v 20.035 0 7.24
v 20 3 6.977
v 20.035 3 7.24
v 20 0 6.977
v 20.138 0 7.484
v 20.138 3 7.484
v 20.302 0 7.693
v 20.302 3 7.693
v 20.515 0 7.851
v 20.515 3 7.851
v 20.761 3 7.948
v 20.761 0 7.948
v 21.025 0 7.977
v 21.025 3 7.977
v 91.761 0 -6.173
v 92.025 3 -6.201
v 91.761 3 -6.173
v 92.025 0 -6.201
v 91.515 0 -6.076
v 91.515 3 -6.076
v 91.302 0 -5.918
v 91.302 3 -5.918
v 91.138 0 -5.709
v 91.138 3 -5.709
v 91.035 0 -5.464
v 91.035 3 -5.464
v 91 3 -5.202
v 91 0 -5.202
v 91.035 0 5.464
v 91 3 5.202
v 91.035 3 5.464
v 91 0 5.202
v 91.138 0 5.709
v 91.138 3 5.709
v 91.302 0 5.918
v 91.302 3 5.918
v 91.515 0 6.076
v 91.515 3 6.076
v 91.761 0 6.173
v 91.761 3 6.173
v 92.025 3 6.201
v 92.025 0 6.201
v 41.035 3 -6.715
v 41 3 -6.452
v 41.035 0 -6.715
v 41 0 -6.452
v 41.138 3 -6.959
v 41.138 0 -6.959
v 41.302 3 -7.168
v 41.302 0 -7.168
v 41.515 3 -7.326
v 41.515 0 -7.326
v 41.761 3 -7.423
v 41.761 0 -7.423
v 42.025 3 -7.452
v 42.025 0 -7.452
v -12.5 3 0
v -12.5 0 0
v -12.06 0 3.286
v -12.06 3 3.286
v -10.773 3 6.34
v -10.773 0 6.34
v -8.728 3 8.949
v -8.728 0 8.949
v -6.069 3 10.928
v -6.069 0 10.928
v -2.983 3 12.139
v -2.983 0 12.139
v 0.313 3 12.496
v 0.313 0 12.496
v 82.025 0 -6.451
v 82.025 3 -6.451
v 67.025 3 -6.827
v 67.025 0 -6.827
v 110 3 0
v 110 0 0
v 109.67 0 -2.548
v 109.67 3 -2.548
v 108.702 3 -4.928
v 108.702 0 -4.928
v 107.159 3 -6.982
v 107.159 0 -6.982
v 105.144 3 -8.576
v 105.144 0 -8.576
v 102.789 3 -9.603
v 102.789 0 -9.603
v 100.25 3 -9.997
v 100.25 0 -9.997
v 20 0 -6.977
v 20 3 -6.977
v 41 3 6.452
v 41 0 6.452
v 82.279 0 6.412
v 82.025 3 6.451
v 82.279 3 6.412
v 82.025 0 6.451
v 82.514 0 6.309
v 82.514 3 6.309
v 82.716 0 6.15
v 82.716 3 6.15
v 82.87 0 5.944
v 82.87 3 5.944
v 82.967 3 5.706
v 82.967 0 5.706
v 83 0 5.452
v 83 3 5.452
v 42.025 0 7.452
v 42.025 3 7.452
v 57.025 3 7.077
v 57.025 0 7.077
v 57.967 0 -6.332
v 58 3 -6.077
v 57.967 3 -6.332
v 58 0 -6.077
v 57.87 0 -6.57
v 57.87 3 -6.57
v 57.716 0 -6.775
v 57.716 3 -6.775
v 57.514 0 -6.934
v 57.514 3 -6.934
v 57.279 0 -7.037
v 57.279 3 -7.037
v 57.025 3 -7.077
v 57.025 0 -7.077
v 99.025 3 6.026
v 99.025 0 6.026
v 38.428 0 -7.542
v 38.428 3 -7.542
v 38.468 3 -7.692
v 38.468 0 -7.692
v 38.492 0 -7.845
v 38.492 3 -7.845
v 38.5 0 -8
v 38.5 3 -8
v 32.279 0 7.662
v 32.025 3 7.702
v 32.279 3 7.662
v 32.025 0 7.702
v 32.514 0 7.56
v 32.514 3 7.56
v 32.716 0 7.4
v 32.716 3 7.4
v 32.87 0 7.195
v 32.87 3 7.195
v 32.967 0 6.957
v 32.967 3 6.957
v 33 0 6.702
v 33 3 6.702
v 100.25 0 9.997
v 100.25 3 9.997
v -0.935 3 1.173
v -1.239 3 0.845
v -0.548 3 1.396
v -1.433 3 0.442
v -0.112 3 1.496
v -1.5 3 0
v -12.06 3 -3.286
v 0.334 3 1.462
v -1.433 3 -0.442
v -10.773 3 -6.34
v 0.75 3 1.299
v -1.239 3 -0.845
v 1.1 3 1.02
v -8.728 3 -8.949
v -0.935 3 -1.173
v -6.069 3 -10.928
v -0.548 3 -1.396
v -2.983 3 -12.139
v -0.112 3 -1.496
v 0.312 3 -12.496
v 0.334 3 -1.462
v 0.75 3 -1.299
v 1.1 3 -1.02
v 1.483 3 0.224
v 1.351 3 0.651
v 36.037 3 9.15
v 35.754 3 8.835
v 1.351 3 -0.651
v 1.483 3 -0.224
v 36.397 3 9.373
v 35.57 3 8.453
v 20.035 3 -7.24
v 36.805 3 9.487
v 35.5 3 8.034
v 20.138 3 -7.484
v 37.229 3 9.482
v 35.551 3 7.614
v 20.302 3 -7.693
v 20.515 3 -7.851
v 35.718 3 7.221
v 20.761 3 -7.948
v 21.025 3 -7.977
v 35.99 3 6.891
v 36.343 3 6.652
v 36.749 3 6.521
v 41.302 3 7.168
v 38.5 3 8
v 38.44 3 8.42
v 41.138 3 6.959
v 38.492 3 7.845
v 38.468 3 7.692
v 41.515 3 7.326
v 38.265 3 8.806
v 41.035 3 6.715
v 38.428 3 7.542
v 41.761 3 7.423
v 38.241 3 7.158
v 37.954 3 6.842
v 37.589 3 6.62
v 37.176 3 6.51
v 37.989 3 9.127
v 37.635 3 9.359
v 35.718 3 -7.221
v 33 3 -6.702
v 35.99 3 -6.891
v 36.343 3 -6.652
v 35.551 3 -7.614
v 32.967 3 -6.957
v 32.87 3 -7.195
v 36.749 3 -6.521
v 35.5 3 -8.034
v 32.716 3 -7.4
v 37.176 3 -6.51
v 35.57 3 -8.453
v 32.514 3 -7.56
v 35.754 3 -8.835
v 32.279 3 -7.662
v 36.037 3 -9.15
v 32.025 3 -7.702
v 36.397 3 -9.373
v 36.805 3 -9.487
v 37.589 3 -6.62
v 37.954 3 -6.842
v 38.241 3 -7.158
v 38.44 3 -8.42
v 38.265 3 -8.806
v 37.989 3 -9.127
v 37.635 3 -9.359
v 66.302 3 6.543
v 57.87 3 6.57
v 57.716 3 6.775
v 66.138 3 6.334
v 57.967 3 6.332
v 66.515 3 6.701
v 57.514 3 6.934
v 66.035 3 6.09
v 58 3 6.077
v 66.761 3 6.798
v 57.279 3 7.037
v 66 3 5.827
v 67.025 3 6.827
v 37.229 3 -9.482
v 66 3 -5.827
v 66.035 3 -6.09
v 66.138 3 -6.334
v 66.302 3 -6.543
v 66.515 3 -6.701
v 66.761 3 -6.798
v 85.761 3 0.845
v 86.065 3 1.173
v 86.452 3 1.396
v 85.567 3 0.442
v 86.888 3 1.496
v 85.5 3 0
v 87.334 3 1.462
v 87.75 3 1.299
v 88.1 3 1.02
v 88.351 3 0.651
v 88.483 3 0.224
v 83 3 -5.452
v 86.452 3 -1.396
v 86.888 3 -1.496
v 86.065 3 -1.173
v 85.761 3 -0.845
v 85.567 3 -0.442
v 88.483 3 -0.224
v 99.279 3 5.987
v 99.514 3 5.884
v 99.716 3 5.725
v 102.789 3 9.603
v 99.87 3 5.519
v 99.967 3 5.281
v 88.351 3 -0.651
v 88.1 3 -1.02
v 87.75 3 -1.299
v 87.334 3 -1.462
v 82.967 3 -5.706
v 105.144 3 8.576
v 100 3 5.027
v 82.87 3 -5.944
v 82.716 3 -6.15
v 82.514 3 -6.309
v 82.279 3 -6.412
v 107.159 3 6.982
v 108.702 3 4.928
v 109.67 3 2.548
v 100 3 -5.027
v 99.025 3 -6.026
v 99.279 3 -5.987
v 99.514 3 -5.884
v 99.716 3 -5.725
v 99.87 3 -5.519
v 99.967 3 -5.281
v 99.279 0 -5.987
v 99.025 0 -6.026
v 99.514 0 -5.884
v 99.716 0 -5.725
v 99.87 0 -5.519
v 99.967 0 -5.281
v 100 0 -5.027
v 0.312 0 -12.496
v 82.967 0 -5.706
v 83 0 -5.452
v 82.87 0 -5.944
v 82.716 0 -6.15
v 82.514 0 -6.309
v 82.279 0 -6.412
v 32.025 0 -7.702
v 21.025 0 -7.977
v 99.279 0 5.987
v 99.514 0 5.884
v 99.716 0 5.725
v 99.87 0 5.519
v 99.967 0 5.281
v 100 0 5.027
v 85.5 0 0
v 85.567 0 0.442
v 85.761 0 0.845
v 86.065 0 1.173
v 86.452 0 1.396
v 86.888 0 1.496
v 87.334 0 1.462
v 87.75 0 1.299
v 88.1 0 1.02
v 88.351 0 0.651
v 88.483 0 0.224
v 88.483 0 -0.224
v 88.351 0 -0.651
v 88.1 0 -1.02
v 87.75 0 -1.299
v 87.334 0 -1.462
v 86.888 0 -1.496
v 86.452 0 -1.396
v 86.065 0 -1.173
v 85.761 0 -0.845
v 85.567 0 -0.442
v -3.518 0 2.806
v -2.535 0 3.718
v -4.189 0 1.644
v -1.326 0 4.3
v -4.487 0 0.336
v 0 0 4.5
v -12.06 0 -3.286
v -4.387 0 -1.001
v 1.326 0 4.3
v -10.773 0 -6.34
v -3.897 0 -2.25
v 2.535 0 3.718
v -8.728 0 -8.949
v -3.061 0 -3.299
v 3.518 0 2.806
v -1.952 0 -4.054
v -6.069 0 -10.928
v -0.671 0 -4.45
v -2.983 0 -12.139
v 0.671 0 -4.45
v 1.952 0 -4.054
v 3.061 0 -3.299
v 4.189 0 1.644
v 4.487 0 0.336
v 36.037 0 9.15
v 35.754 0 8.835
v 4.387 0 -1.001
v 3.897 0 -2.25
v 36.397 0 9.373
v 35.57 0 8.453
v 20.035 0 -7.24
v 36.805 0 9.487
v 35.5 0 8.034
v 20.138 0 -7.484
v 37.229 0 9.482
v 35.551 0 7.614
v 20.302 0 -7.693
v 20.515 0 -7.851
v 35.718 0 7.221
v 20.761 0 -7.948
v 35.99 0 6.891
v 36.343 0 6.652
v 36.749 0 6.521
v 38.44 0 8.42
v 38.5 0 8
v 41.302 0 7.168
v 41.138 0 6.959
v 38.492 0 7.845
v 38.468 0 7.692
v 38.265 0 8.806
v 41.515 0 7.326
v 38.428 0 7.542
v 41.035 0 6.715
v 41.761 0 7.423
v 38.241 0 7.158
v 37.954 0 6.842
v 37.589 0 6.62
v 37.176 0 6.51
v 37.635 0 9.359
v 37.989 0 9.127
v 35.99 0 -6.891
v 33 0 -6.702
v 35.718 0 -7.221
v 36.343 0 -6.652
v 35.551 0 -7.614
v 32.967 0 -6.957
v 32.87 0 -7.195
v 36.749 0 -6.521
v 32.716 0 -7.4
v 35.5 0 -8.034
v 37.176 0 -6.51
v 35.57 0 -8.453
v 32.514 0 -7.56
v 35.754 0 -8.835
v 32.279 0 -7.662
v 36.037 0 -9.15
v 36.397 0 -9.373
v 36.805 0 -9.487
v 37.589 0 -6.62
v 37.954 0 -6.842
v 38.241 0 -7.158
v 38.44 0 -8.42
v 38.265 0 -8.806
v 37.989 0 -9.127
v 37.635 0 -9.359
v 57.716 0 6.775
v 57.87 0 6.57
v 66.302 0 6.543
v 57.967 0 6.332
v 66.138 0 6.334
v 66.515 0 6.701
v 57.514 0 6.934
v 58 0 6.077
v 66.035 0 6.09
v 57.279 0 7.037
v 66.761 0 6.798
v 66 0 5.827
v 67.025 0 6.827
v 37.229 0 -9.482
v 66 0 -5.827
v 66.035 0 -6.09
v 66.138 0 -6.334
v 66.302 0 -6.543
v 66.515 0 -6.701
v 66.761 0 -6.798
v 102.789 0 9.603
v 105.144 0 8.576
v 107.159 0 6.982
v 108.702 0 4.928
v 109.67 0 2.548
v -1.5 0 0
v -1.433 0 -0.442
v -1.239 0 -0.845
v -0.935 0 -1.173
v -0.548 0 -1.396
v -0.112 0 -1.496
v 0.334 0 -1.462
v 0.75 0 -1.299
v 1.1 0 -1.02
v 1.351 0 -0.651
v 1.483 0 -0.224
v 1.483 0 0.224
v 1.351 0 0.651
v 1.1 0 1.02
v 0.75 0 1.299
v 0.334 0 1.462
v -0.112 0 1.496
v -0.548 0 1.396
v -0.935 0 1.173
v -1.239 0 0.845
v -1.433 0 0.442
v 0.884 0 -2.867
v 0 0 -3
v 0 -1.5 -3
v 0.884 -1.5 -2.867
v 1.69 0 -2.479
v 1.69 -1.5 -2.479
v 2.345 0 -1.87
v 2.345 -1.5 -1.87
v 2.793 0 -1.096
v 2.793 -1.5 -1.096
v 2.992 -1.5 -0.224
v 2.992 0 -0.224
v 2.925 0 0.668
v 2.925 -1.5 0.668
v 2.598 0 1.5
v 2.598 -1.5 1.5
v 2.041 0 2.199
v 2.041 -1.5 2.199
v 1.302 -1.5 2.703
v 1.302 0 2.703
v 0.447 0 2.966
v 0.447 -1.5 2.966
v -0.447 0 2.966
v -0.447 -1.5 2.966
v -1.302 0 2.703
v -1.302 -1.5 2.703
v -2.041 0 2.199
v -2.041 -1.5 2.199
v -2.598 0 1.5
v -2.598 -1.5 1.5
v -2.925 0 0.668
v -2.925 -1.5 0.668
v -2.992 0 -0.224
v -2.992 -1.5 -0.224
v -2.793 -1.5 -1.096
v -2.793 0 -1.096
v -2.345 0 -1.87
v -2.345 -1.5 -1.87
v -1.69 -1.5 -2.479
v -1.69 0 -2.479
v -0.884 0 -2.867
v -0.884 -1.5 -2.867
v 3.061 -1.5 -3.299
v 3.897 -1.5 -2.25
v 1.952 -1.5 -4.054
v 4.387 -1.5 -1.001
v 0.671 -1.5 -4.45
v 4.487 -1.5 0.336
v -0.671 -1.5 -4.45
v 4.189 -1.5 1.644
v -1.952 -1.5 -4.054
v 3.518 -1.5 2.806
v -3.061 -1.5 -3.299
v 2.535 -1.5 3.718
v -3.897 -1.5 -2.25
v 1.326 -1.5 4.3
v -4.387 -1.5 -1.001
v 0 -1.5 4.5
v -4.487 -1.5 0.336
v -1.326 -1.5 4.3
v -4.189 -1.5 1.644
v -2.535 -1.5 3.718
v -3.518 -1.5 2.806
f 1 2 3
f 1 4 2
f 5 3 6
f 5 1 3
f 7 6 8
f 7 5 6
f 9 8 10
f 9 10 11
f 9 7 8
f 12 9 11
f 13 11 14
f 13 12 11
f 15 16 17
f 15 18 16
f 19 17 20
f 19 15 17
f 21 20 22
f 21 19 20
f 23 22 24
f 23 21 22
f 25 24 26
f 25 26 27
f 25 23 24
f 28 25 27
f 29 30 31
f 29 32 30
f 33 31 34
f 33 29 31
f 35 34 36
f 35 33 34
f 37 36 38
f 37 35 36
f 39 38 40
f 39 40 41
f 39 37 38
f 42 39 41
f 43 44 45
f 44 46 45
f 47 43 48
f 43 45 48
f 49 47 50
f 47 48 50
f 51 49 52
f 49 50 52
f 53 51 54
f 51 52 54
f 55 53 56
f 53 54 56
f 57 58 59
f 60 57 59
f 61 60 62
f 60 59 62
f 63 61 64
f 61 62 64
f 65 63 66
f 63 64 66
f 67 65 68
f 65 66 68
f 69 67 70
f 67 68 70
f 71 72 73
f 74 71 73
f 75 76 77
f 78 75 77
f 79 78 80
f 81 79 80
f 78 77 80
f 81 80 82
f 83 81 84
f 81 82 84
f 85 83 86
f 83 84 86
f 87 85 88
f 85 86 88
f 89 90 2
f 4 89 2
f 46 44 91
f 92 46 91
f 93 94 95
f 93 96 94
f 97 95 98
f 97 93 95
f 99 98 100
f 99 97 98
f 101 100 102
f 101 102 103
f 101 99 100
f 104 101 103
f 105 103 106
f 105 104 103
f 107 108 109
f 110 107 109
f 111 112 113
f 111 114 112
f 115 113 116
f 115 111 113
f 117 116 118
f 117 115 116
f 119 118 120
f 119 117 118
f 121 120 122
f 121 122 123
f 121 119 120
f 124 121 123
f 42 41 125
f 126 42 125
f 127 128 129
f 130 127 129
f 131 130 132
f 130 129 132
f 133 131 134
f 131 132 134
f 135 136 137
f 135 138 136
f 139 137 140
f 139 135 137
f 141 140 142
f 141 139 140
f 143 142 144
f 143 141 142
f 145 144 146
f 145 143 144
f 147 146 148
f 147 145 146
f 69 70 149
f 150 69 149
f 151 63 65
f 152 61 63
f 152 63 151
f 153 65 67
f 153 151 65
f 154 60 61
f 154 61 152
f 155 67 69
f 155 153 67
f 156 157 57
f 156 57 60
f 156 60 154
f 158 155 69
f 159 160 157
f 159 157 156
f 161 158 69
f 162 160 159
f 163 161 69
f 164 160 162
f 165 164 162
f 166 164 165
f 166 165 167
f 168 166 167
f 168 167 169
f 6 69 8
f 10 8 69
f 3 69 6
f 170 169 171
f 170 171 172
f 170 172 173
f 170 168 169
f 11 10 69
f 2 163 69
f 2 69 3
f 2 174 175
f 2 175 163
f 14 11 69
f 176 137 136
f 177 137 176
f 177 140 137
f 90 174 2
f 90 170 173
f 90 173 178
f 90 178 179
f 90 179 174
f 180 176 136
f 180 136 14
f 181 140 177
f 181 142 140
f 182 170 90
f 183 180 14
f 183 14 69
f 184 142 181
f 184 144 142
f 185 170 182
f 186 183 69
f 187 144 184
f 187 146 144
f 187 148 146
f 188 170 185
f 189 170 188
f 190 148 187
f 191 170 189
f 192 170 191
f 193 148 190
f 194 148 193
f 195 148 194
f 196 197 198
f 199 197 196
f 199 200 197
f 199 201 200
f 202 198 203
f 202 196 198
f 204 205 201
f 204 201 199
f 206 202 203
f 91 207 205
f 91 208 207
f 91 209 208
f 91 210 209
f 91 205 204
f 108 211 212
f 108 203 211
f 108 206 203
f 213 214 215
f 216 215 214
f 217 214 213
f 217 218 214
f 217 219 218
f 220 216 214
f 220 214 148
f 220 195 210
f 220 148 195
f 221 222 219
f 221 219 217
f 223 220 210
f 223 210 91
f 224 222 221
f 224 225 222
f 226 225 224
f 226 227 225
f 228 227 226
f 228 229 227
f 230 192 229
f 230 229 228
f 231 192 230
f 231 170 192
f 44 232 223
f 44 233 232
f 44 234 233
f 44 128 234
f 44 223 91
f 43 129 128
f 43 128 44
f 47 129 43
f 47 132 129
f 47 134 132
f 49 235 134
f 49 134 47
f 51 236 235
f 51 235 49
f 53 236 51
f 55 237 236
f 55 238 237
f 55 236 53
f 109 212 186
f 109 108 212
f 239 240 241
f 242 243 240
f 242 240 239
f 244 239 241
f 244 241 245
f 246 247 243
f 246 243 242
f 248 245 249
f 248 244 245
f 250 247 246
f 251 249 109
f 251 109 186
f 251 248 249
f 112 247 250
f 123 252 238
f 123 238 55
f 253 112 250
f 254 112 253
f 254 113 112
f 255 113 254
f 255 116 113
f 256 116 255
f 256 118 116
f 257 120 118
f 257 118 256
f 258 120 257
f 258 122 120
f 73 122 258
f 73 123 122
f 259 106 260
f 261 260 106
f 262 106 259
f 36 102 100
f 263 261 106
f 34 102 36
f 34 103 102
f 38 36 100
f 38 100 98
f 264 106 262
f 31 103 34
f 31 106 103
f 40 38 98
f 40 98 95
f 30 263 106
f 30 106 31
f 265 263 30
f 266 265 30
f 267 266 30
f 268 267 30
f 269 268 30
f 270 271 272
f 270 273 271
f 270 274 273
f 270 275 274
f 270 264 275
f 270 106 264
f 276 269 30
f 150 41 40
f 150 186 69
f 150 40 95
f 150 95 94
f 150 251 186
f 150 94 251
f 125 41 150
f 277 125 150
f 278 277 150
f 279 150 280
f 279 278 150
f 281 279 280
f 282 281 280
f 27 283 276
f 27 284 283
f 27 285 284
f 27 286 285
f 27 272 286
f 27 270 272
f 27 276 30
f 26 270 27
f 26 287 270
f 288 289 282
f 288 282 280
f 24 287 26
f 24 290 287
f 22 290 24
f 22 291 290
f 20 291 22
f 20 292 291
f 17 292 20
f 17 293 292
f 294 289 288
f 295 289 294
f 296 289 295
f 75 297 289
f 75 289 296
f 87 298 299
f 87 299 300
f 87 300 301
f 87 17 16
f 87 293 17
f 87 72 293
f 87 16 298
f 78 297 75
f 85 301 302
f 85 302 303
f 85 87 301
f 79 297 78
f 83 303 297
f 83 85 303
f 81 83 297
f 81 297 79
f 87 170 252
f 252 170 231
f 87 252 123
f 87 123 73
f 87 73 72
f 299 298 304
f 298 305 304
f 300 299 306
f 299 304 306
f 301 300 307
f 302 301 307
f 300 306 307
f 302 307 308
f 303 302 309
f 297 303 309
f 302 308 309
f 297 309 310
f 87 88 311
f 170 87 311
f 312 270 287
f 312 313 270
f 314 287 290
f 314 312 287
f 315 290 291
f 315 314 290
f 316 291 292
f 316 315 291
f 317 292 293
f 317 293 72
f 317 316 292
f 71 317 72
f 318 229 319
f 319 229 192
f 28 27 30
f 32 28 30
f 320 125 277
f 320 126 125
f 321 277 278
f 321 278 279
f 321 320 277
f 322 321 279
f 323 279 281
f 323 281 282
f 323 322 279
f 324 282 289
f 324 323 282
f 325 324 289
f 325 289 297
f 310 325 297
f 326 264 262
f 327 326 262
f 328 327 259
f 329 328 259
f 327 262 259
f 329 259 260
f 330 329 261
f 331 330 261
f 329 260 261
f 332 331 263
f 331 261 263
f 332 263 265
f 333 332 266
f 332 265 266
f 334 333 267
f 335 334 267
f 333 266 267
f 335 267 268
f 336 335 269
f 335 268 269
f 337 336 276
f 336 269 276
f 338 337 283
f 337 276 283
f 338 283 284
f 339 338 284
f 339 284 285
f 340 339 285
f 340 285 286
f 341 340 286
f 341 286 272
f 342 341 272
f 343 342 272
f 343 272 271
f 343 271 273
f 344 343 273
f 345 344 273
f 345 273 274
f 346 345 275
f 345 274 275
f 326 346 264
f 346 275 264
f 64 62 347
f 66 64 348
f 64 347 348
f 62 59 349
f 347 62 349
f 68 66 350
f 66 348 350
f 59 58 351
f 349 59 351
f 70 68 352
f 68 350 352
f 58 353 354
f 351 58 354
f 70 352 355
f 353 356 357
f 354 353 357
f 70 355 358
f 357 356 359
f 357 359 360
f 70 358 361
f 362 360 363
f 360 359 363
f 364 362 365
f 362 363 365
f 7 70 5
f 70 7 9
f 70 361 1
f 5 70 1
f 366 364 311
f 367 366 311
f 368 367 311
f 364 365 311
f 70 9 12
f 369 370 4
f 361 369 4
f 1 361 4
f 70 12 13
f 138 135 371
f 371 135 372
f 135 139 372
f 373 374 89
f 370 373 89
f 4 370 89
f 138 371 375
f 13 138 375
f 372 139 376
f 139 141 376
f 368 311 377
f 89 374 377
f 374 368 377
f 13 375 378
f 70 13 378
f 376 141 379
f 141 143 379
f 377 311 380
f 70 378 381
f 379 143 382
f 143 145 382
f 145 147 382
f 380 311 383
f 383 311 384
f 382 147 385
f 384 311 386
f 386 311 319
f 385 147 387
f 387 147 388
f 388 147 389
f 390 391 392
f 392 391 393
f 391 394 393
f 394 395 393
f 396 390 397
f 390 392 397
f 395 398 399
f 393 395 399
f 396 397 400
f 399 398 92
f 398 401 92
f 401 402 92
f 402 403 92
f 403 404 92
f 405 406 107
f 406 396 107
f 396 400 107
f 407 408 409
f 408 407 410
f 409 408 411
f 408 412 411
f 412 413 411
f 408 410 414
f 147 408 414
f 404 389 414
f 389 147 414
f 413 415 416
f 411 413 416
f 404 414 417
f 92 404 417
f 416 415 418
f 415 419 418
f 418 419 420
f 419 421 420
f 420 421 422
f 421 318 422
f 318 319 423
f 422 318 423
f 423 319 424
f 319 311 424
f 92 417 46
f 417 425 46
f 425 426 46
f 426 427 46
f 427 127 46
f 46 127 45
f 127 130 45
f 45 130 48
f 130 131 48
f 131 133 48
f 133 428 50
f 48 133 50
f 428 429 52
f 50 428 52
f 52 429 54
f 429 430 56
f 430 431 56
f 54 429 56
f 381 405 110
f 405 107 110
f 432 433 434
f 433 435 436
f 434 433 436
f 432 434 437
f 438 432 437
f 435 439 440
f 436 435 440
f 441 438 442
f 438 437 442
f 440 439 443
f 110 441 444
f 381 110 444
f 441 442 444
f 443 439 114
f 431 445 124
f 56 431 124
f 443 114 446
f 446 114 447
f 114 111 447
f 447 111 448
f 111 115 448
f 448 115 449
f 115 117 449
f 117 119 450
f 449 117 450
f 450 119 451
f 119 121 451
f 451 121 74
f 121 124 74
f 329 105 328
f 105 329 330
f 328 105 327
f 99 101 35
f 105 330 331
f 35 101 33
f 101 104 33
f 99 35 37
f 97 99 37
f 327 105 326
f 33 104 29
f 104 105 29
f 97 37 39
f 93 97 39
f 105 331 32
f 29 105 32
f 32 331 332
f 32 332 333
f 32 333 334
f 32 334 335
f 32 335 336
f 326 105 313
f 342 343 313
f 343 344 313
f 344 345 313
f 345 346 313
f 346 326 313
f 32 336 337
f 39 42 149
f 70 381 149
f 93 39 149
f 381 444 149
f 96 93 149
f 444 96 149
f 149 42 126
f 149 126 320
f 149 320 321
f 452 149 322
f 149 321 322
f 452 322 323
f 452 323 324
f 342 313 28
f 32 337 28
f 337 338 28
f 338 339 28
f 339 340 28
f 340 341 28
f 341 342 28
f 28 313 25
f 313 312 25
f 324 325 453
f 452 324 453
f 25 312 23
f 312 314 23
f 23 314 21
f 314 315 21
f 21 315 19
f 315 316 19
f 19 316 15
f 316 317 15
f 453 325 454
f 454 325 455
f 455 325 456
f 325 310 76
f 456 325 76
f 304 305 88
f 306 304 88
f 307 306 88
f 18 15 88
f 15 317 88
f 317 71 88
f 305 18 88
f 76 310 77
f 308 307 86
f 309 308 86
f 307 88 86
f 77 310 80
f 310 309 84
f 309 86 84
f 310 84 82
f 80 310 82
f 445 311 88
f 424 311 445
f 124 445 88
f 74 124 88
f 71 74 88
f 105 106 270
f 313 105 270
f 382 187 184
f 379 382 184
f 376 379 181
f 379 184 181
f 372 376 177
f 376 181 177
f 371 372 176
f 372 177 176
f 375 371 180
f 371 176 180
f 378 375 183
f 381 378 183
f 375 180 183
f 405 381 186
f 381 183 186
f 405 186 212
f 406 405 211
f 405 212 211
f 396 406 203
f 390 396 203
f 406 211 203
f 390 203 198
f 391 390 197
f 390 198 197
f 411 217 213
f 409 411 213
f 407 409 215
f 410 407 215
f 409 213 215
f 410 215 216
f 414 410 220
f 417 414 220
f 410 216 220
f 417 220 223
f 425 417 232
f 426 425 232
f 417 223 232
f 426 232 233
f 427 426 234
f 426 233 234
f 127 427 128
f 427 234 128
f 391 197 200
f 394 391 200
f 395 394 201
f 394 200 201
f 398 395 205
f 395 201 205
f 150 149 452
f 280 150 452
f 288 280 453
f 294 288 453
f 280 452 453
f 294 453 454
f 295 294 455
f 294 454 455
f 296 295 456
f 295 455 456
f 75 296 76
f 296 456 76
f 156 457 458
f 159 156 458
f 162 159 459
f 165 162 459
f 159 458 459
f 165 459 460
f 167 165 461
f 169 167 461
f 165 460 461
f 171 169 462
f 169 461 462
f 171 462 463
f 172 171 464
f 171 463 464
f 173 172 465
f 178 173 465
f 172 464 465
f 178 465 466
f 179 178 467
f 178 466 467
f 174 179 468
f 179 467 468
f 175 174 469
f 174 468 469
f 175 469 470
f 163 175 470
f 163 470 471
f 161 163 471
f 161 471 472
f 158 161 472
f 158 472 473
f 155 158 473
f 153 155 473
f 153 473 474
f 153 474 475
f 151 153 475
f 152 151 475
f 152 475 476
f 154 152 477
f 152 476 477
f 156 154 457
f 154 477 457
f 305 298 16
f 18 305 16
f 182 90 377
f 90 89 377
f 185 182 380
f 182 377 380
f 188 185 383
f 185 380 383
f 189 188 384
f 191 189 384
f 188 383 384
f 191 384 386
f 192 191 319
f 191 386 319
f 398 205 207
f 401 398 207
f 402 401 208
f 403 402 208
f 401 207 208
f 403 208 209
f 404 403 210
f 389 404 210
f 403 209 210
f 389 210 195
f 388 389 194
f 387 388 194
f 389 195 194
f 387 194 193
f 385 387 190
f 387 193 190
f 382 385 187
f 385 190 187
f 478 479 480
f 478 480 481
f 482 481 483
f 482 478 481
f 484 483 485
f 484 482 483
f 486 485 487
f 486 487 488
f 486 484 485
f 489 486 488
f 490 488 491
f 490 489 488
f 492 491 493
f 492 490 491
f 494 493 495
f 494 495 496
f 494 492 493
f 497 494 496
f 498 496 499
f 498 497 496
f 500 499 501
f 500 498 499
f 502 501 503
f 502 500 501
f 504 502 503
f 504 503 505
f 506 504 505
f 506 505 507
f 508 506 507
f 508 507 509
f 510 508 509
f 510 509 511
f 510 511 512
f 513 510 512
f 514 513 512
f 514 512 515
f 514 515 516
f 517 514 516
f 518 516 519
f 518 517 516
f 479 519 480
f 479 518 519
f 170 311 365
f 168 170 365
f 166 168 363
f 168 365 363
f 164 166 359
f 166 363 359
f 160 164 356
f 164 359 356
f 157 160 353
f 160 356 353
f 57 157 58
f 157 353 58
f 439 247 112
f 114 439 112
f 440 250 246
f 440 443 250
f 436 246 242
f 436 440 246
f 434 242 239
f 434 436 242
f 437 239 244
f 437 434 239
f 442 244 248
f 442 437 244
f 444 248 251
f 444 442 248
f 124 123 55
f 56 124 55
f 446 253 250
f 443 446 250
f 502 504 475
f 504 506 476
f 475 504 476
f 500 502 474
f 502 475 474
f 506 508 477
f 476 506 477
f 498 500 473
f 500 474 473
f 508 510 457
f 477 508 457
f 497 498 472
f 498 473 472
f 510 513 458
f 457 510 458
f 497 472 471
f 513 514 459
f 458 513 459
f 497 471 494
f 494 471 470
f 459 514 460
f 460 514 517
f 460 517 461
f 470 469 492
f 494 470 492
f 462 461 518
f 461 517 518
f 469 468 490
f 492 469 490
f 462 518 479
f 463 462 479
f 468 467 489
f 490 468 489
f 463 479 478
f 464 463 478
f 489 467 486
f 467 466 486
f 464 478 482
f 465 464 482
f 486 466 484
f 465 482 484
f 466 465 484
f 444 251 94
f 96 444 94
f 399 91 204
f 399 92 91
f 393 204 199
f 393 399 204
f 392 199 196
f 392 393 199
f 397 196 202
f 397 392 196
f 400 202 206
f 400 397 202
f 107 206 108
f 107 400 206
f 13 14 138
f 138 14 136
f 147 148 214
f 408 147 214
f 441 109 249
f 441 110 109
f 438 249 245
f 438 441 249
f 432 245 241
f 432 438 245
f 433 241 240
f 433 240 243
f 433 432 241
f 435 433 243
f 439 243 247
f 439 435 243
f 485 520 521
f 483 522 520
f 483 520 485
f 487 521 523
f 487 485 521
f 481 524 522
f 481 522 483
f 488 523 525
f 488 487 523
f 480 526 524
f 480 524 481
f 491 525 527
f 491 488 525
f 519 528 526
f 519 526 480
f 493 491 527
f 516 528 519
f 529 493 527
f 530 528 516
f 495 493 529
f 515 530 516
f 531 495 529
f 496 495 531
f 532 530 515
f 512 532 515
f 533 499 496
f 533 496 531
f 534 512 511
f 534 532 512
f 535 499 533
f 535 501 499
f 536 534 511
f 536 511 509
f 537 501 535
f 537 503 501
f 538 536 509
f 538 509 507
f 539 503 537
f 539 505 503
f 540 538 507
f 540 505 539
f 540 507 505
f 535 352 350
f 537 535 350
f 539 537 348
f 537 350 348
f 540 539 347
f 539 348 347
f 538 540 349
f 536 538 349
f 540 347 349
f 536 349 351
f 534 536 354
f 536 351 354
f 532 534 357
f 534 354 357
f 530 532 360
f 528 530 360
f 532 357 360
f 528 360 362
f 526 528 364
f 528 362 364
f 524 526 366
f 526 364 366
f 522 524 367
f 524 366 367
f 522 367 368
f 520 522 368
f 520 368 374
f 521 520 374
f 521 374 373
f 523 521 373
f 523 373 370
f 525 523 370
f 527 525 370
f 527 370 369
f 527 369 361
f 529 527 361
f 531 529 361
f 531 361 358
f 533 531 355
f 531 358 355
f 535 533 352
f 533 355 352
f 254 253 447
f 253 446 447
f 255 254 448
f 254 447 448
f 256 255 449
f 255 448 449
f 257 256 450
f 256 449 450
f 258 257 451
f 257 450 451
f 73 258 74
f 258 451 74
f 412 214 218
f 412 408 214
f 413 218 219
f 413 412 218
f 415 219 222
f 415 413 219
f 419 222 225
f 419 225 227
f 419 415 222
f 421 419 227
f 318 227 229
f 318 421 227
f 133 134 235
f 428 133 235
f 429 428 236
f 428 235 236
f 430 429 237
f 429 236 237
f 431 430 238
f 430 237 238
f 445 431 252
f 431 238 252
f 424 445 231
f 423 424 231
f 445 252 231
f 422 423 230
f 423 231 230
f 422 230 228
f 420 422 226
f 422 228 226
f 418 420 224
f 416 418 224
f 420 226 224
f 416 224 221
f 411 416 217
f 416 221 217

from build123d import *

# Parameters (mm, degrees)
EXTRUDE_1_DEPTH     = 3
SKETCH_2_R          = 4.5
SKETCH_2_R_2        = 3
EXTRUDE_2_DEPTH     = 1.5
CUT_EXTRUDE_1_DEPTH = 3
FILLET_1_R          = 1


with BuildPart() as part:
    # 草图1 → 凸台-拉伸1 (new body)
    with BuildSketch(Plane(origin=(0, 0, 0), x_dir=(1, 0, 0), z_dir=(0, 1, 0))):
        with BuildLine():
            ThreePointArc((-1.5, 0), (0, 1.5), (1.5, 0))
            Line((1.5, 0), (12.5, 0))
            ThreePointArc((12.5, 0), (8.948638165, 8.727650027), (0.3125, 12.496093139))
            ThreePointArc((0.3125, 12.496093139), (-8.727650027, 8.948638165), (-12.5, 0))
            Line((-12.5, 0), (-1.5, 0))
        make_face()
        with BuildLine():
            Line((12.5, 0), (1.5, 0))
            ThreePointArc((1.5, 0), (0, -1.5), (-1.5, 0))
            Line((-1.5, 0), (-12.5, 0))
            ThreePointArc((-12.5, 0), (-8.727650027, -8.948638165), (0.3125, -12.496093139))
            ThreePointArc((0.3125, -12.496093139), (8.948638165, -8.727650027), (12.5, 0))
        make_face()
        with BuildLine():
            ThreePointArc((0.3125, 12.496093139), (8.948638165, 8.727650027), (12.5, 0))
            Line((12.5, 0), (90, 0))
            ThreePointArc((90, 0), (93.017879978, 7.158910532), (100.25, 9.996874512))
            Line((100.25, 9.996874512), (0.3125, 12.496093139))
        make_face()
        with BuildLine():
            Line((90, 0), (12.5, 0))
            ThreePointArc((12.5, 0), (8.948638165, -8.727650027), (0.3125, -12.496093139))
            Line((0.3125, -12.496093139), (100.25, -9.996874512))
            ThreePointArc((100.25, -9.996874512), (93.017879978, -7.158910532), (90, 0))
        make_face()
        with BuildLine():
            ThreePointArc((100.25, 9.996874512), (93.017879978, 7.158910532), (90, 0))
            Line((90, 0), (110, 0))
            ThreePointArc((110, 0), (107.158910532, 6.982120022), (100.25, 9.996874512))
        make_face()
        with BuildLine():
            Line((110, 0), (90, 0))
            ThreePointArc((90, 0), (93.017879978, -7.158910532), (100.25, -9.996874512))
            ThreePointArc((100.25, -9.996874512), (107.158910532, -6.982120022), (110, 0))
        make_face()
    extrude(amount=EXTRUDE_1_DEPTH)

    # 草图2 → 凸台-拉伸2 (add)
    with BuildSketch(Plane.XZ):
        with Locations(Location((0, 0, 0), (0, 0, 90))):
            Circle(SKETCH_2_R)
        with Locations(Location((0, 0, 0), (0, 0, 270))):
            Circle(SKETCH_2_R_2, mode=Mode.SUBTRACT)
    extrude(amount=EXTRUDE_2_DEPTH)

    # 草图3 → 切除-拉伸1 (cut)
    with BuildSketch(Plane(origin=(0, 3, 0), x_dir=(1, 0, 0), z_dir=(0, 1, 0))):
        Polygon((20, 8.002501172), (20, 0), (33, 0), (33, 7.677399562), align=None)
        Polygon((33, 0), (20, 0), (20, -8.002501172), (33, -7.677399562), align=None)
        with BuildLine():
            ThreePointArc((38.5, 8), (36.805156295, 9.487291475), (35.550618759, 7.613614157))
            Line((35.550618759, 7.613614157), (38.42825626, 7.541650728))
            ThreePointArc((38.42825626, 7.541650728), (38.481955531, 7.768034906), (38.5, 8))
        make_face()
        with BuildLine():
            Line((38.42825626, 7.541650728), (35.550618759, 7.613614157))
            ThreePointArc((35.550618759, 7.613614157), (36.9625, 6.500468823), (38.42825626, 7.541650728))
        make_face()
        with BuildLine():
            ThreePointArc((38.42825626, -7.541650728), (36.9625, -6.500468823), (35.550618759, -7.613614157))
            Line((35.550618759, -7.613614157), (38.42825626, -7.541650728))
        make_face()
        with BuildLine():
            Line((38.42825626, -7.541650728), (35.550618759, -7.613614157))
            ThreePointArc((35.550618759, -7.613614157), (36.805156295, -9.487291475), (38.5, -8))
            ThreePointArc((38.5, -8), (38.481955531, -7.768034906), (38.42825626, -7.541650728))
        make_face()
        Polygon((41, 7.477337033), (41, 0), (58, 0), (58, 7.052204158), align=None)
        Polygon((58, 0), (41, 0), (41, -7.477337033), (58, -7.052204158), align=None)
        Polygon((66, 6.852141629), (66, 0), (83, 0), (83, 6.427008754), align=None)
        Polygon((83, 0), (66, 0), (66, -6.852141629), (83, -6.427008754), align=None)
        with BuildLine():
            ThreePointArc((88.5, 0), (87, 1.5), (85.5, 0))
            Line((85.5, 0), (88.5, 0))
        make_face()
        with BuildLine():
            Line((88.5, 0), (85.5, 0))
            ThreePointArc((85.5, 0), (87, -1.5), (88.5, 0))
        make_face()
        Polygon((100, 6.001875879), (91, 6.226946225), (91, 0), (100, 0), align=None)
        Polygon((91, 0), (91, -6.226946225), (100, -6.001875879), (100, 0), align=None)
    extrude(amount=-CUT_EXTRUDE_1_DEPTH, mode=Mode.SUBTRACT)

    # 圆角1
    fillet_1_edges = [part.edges().sort_by_distance(p)[0] for p in [
        (20, 1.5, 8.002501172),
        (20, 1.5, -8.002501172),
        (33, 1.5, -7.677399562),
        (33, 1.5, 7.677399562),
        (41, 1.5, 7.477337033),
        (41, 1.5, -7.477337033),
        (58, 1.5, -7.052204158),
        (58, 1.5, 7.052204158),
        (66, 1.5, 6.852141629),
        (66, 1.5, -6.852141629),
        (83, 1.5, -6.427008754),
        (83, 1.5, 6.427008754),
        (91, 1.5, 6.226946225),
        (91, 1.5, -6.226946225),
        (100, 1.5, -6.001875879),
        (100, 1.5, 6.001875879),
    ]]
    fillet(fillet_1_edges, radius=FILLET_1_R)


solid = part.part
